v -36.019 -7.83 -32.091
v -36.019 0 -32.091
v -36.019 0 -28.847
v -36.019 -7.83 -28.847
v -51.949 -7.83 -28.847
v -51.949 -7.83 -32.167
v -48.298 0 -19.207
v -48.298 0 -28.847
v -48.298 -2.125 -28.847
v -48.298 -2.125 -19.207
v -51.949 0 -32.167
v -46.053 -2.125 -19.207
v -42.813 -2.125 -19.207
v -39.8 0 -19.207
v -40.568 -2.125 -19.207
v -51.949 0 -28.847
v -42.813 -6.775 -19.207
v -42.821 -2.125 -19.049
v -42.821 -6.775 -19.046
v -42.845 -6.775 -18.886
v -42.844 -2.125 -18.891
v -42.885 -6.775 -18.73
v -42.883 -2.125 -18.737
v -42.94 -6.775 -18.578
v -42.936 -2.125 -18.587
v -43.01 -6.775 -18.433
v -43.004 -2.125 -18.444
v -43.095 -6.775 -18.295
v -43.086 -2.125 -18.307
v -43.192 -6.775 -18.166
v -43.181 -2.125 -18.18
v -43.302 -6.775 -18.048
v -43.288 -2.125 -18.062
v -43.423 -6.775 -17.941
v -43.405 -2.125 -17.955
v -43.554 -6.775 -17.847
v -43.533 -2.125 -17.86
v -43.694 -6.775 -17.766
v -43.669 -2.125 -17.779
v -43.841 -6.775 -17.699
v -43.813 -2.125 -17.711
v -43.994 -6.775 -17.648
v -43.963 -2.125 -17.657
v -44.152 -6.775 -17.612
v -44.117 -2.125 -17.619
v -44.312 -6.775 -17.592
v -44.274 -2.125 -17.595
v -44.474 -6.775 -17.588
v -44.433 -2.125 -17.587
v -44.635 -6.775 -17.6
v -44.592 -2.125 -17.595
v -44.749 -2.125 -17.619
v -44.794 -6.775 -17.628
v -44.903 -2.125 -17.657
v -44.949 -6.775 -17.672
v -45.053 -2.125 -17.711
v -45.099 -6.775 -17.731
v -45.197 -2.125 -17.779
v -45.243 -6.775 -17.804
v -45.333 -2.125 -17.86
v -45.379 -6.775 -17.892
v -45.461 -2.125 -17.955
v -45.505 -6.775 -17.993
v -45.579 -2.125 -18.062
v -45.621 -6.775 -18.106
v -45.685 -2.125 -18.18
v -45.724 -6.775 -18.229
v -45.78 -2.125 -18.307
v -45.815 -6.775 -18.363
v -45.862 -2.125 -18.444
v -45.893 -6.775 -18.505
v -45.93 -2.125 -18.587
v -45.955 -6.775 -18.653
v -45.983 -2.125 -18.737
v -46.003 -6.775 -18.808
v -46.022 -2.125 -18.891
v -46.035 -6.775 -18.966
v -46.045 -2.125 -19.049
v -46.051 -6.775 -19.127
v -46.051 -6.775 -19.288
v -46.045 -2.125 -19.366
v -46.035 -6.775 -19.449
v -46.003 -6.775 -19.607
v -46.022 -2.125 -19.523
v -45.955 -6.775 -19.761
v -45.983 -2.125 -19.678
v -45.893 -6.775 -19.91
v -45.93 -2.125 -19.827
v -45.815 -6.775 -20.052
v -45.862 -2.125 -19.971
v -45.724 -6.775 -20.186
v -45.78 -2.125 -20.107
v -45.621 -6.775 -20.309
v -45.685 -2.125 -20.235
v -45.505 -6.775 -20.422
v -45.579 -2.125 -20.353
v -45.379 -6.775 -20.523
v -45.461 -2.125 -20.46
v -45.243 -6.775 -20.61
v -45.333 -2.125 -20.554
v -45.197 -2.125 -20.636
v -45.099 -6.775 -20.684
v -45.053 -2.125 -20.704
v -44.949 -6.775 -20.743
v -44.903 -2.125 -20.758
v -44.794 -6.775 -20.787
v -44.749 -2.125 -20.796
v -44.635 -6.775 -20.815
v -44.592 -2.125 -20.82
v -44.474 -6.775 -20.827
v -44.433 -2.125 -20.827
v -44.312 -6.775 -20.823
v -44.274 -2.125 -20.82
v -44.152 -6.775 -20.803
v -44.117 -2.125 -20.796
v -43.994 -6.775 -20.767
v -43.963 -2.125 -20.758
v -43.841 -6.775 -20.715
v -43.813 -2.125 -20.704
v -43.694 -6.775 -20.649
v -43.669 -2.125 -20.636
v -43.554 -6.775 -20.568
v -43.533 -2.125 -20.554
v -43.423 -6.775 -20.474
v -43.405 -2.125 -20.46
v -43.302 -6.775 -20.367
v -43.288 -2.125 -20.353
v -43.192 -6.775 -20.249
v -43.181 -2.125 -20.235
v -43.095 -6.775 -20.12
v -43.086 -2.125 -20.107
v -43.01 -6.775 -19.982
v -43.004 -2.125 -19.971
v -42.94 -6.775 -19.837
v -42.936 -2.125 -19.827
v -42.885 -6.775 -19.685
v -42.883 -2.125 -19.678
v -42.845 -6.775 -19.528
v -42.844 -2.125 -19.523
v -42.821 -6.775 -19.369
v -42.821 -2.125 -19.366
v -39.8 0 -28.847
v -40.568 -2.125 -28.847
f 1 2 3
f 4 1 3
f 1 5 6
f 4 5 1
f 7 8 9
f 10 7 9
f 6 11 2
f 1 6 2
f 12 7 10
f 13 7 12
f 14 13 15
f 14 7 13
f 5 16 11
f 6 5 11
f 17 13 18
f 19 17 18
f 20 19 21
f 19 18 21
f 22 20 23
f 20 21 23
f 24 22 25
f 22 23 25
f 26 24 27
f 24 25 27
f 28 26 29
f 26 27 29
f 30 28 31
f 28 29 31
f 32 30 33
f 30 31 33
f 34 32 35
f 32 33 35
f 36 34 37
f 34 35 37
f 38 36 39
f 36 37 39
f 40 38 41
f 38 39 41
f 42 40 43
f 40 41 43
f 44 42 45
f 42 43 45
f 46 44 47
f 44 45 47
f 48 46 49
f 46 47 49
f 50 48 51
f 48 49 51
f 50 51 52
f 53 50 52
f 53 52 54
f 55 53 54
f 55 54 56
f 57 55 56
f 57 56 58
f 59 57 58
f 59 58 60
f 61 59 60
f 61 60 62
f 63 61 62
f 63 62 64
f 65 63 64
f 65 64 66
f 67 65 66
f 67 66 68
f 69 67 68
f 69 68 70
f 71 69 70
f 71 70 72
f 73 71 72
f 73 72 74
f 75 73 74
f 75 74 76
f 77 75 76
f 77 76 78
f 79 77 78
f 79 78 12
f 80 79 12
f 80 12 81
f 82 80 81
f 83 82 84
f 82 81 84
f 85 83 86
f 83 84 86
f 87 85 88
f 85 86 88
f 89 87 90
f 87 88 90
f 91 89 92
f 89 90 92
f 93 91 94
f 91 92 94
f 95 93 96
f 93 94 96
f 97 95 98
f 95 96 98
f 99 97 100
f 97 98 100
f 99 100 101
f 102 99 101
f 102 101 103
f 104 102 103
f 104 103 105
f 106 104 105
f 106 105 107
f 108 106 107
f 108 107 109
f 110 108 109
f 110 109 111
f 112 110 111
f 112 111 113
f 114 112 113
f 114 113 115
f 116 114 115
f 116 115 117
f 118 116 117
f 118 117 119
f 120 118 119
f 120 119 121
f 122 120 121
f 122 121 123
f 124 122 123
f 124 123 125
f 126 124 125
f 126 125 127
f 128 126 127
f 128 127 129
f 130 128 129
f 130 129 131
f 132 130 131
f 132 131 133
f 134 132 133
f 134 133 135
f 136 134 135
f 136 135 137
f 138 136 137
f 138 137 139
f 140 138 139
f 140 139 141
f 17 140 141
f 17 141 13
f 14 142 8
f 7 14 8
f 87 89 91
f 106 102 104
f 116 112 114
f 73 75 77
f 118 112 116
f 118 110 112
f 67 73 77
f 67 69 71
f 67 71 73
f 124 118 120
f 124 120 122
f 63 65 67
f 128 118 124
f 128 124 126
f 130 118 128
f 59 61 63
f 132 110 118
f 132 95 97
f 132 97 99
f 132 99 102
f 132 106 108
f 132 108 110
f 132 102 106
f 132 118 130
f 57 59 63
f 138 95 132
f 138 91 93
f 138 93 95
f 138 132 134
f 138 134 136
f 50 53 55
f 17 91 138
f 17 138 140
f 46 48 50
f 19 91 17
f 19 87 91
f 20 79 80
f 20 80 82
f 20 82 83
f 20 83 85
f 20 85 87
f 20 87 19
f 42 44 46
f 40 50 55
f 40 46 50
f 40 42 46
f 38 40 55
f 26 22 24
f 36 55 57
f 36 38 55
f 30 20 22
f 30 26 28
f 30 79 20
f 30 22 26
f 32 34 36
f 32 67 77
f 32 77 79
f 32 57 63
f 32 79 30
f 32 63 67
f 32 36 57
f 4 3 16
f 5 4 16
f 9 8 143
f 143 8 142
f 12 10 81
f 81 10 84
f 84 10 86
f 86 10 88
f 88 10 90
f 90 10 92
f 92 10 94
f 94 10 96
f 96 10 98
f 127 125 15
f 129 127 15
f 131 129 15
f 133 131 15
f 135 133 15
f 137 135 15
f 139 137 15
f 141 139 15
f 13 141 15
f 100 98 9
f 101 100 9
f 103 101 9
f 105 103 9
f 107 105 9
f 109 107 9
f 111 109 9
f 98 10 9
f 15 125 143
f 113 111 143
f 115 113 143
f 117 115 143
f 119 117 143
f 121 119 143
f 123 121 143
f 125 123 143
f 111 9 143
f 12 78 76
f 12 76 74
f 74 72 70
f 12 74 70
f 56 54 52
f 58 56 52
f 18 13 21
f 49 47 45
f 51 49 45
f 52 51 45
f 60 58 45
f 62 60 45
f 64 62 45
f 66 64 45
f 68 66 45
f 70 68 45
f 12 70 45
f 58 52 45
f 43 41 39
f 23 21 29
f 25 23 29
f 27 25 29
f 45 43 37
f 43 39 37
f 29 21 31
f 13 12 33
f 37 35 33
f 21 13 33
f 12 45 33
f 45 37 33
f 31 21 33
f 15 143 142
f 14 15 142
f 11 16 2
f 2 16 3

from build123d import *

# Parameters (mm, degrees)
F1_DEPTH = 7.83
F3_DEPTH = 9.64
F4_R     = 1.62
F5_DEPTH = 4.65


with BuildPart() as f1:
    # F0 (on Front) → F1 (new body)
    with BuildSketch(Plane.XZ):
        Polygon((-36.018939, -28.847411), (-51.948939, -28.847411), (-51.948939, -32.167411), (-36.019121, -32.091239), align=None)
    extrude(amount=F1_DEPTH)


with BuildPart() as f3:
    # F2 (on face) → F3 (new body)
    with BuildSketch(Plane.XY.offset(-28.847411)):
        Polygon((-39.79991, 0), (-48.298113, 0), (-48.298113, -2.12455), (-40.568113, -2.12455), align=None)
    extrude(amount=F3_DEPTH)

    # F4 (on face) → F5 (join)
    with BuildSketch(Plane.XZ.offset(2.12455)):
        with Locations((-44.433113, -19.207411)):
            Circle(F4_R)
    extrude(amount=F5_DEPTH)


solid = Compound([f1.part, f3.part])
